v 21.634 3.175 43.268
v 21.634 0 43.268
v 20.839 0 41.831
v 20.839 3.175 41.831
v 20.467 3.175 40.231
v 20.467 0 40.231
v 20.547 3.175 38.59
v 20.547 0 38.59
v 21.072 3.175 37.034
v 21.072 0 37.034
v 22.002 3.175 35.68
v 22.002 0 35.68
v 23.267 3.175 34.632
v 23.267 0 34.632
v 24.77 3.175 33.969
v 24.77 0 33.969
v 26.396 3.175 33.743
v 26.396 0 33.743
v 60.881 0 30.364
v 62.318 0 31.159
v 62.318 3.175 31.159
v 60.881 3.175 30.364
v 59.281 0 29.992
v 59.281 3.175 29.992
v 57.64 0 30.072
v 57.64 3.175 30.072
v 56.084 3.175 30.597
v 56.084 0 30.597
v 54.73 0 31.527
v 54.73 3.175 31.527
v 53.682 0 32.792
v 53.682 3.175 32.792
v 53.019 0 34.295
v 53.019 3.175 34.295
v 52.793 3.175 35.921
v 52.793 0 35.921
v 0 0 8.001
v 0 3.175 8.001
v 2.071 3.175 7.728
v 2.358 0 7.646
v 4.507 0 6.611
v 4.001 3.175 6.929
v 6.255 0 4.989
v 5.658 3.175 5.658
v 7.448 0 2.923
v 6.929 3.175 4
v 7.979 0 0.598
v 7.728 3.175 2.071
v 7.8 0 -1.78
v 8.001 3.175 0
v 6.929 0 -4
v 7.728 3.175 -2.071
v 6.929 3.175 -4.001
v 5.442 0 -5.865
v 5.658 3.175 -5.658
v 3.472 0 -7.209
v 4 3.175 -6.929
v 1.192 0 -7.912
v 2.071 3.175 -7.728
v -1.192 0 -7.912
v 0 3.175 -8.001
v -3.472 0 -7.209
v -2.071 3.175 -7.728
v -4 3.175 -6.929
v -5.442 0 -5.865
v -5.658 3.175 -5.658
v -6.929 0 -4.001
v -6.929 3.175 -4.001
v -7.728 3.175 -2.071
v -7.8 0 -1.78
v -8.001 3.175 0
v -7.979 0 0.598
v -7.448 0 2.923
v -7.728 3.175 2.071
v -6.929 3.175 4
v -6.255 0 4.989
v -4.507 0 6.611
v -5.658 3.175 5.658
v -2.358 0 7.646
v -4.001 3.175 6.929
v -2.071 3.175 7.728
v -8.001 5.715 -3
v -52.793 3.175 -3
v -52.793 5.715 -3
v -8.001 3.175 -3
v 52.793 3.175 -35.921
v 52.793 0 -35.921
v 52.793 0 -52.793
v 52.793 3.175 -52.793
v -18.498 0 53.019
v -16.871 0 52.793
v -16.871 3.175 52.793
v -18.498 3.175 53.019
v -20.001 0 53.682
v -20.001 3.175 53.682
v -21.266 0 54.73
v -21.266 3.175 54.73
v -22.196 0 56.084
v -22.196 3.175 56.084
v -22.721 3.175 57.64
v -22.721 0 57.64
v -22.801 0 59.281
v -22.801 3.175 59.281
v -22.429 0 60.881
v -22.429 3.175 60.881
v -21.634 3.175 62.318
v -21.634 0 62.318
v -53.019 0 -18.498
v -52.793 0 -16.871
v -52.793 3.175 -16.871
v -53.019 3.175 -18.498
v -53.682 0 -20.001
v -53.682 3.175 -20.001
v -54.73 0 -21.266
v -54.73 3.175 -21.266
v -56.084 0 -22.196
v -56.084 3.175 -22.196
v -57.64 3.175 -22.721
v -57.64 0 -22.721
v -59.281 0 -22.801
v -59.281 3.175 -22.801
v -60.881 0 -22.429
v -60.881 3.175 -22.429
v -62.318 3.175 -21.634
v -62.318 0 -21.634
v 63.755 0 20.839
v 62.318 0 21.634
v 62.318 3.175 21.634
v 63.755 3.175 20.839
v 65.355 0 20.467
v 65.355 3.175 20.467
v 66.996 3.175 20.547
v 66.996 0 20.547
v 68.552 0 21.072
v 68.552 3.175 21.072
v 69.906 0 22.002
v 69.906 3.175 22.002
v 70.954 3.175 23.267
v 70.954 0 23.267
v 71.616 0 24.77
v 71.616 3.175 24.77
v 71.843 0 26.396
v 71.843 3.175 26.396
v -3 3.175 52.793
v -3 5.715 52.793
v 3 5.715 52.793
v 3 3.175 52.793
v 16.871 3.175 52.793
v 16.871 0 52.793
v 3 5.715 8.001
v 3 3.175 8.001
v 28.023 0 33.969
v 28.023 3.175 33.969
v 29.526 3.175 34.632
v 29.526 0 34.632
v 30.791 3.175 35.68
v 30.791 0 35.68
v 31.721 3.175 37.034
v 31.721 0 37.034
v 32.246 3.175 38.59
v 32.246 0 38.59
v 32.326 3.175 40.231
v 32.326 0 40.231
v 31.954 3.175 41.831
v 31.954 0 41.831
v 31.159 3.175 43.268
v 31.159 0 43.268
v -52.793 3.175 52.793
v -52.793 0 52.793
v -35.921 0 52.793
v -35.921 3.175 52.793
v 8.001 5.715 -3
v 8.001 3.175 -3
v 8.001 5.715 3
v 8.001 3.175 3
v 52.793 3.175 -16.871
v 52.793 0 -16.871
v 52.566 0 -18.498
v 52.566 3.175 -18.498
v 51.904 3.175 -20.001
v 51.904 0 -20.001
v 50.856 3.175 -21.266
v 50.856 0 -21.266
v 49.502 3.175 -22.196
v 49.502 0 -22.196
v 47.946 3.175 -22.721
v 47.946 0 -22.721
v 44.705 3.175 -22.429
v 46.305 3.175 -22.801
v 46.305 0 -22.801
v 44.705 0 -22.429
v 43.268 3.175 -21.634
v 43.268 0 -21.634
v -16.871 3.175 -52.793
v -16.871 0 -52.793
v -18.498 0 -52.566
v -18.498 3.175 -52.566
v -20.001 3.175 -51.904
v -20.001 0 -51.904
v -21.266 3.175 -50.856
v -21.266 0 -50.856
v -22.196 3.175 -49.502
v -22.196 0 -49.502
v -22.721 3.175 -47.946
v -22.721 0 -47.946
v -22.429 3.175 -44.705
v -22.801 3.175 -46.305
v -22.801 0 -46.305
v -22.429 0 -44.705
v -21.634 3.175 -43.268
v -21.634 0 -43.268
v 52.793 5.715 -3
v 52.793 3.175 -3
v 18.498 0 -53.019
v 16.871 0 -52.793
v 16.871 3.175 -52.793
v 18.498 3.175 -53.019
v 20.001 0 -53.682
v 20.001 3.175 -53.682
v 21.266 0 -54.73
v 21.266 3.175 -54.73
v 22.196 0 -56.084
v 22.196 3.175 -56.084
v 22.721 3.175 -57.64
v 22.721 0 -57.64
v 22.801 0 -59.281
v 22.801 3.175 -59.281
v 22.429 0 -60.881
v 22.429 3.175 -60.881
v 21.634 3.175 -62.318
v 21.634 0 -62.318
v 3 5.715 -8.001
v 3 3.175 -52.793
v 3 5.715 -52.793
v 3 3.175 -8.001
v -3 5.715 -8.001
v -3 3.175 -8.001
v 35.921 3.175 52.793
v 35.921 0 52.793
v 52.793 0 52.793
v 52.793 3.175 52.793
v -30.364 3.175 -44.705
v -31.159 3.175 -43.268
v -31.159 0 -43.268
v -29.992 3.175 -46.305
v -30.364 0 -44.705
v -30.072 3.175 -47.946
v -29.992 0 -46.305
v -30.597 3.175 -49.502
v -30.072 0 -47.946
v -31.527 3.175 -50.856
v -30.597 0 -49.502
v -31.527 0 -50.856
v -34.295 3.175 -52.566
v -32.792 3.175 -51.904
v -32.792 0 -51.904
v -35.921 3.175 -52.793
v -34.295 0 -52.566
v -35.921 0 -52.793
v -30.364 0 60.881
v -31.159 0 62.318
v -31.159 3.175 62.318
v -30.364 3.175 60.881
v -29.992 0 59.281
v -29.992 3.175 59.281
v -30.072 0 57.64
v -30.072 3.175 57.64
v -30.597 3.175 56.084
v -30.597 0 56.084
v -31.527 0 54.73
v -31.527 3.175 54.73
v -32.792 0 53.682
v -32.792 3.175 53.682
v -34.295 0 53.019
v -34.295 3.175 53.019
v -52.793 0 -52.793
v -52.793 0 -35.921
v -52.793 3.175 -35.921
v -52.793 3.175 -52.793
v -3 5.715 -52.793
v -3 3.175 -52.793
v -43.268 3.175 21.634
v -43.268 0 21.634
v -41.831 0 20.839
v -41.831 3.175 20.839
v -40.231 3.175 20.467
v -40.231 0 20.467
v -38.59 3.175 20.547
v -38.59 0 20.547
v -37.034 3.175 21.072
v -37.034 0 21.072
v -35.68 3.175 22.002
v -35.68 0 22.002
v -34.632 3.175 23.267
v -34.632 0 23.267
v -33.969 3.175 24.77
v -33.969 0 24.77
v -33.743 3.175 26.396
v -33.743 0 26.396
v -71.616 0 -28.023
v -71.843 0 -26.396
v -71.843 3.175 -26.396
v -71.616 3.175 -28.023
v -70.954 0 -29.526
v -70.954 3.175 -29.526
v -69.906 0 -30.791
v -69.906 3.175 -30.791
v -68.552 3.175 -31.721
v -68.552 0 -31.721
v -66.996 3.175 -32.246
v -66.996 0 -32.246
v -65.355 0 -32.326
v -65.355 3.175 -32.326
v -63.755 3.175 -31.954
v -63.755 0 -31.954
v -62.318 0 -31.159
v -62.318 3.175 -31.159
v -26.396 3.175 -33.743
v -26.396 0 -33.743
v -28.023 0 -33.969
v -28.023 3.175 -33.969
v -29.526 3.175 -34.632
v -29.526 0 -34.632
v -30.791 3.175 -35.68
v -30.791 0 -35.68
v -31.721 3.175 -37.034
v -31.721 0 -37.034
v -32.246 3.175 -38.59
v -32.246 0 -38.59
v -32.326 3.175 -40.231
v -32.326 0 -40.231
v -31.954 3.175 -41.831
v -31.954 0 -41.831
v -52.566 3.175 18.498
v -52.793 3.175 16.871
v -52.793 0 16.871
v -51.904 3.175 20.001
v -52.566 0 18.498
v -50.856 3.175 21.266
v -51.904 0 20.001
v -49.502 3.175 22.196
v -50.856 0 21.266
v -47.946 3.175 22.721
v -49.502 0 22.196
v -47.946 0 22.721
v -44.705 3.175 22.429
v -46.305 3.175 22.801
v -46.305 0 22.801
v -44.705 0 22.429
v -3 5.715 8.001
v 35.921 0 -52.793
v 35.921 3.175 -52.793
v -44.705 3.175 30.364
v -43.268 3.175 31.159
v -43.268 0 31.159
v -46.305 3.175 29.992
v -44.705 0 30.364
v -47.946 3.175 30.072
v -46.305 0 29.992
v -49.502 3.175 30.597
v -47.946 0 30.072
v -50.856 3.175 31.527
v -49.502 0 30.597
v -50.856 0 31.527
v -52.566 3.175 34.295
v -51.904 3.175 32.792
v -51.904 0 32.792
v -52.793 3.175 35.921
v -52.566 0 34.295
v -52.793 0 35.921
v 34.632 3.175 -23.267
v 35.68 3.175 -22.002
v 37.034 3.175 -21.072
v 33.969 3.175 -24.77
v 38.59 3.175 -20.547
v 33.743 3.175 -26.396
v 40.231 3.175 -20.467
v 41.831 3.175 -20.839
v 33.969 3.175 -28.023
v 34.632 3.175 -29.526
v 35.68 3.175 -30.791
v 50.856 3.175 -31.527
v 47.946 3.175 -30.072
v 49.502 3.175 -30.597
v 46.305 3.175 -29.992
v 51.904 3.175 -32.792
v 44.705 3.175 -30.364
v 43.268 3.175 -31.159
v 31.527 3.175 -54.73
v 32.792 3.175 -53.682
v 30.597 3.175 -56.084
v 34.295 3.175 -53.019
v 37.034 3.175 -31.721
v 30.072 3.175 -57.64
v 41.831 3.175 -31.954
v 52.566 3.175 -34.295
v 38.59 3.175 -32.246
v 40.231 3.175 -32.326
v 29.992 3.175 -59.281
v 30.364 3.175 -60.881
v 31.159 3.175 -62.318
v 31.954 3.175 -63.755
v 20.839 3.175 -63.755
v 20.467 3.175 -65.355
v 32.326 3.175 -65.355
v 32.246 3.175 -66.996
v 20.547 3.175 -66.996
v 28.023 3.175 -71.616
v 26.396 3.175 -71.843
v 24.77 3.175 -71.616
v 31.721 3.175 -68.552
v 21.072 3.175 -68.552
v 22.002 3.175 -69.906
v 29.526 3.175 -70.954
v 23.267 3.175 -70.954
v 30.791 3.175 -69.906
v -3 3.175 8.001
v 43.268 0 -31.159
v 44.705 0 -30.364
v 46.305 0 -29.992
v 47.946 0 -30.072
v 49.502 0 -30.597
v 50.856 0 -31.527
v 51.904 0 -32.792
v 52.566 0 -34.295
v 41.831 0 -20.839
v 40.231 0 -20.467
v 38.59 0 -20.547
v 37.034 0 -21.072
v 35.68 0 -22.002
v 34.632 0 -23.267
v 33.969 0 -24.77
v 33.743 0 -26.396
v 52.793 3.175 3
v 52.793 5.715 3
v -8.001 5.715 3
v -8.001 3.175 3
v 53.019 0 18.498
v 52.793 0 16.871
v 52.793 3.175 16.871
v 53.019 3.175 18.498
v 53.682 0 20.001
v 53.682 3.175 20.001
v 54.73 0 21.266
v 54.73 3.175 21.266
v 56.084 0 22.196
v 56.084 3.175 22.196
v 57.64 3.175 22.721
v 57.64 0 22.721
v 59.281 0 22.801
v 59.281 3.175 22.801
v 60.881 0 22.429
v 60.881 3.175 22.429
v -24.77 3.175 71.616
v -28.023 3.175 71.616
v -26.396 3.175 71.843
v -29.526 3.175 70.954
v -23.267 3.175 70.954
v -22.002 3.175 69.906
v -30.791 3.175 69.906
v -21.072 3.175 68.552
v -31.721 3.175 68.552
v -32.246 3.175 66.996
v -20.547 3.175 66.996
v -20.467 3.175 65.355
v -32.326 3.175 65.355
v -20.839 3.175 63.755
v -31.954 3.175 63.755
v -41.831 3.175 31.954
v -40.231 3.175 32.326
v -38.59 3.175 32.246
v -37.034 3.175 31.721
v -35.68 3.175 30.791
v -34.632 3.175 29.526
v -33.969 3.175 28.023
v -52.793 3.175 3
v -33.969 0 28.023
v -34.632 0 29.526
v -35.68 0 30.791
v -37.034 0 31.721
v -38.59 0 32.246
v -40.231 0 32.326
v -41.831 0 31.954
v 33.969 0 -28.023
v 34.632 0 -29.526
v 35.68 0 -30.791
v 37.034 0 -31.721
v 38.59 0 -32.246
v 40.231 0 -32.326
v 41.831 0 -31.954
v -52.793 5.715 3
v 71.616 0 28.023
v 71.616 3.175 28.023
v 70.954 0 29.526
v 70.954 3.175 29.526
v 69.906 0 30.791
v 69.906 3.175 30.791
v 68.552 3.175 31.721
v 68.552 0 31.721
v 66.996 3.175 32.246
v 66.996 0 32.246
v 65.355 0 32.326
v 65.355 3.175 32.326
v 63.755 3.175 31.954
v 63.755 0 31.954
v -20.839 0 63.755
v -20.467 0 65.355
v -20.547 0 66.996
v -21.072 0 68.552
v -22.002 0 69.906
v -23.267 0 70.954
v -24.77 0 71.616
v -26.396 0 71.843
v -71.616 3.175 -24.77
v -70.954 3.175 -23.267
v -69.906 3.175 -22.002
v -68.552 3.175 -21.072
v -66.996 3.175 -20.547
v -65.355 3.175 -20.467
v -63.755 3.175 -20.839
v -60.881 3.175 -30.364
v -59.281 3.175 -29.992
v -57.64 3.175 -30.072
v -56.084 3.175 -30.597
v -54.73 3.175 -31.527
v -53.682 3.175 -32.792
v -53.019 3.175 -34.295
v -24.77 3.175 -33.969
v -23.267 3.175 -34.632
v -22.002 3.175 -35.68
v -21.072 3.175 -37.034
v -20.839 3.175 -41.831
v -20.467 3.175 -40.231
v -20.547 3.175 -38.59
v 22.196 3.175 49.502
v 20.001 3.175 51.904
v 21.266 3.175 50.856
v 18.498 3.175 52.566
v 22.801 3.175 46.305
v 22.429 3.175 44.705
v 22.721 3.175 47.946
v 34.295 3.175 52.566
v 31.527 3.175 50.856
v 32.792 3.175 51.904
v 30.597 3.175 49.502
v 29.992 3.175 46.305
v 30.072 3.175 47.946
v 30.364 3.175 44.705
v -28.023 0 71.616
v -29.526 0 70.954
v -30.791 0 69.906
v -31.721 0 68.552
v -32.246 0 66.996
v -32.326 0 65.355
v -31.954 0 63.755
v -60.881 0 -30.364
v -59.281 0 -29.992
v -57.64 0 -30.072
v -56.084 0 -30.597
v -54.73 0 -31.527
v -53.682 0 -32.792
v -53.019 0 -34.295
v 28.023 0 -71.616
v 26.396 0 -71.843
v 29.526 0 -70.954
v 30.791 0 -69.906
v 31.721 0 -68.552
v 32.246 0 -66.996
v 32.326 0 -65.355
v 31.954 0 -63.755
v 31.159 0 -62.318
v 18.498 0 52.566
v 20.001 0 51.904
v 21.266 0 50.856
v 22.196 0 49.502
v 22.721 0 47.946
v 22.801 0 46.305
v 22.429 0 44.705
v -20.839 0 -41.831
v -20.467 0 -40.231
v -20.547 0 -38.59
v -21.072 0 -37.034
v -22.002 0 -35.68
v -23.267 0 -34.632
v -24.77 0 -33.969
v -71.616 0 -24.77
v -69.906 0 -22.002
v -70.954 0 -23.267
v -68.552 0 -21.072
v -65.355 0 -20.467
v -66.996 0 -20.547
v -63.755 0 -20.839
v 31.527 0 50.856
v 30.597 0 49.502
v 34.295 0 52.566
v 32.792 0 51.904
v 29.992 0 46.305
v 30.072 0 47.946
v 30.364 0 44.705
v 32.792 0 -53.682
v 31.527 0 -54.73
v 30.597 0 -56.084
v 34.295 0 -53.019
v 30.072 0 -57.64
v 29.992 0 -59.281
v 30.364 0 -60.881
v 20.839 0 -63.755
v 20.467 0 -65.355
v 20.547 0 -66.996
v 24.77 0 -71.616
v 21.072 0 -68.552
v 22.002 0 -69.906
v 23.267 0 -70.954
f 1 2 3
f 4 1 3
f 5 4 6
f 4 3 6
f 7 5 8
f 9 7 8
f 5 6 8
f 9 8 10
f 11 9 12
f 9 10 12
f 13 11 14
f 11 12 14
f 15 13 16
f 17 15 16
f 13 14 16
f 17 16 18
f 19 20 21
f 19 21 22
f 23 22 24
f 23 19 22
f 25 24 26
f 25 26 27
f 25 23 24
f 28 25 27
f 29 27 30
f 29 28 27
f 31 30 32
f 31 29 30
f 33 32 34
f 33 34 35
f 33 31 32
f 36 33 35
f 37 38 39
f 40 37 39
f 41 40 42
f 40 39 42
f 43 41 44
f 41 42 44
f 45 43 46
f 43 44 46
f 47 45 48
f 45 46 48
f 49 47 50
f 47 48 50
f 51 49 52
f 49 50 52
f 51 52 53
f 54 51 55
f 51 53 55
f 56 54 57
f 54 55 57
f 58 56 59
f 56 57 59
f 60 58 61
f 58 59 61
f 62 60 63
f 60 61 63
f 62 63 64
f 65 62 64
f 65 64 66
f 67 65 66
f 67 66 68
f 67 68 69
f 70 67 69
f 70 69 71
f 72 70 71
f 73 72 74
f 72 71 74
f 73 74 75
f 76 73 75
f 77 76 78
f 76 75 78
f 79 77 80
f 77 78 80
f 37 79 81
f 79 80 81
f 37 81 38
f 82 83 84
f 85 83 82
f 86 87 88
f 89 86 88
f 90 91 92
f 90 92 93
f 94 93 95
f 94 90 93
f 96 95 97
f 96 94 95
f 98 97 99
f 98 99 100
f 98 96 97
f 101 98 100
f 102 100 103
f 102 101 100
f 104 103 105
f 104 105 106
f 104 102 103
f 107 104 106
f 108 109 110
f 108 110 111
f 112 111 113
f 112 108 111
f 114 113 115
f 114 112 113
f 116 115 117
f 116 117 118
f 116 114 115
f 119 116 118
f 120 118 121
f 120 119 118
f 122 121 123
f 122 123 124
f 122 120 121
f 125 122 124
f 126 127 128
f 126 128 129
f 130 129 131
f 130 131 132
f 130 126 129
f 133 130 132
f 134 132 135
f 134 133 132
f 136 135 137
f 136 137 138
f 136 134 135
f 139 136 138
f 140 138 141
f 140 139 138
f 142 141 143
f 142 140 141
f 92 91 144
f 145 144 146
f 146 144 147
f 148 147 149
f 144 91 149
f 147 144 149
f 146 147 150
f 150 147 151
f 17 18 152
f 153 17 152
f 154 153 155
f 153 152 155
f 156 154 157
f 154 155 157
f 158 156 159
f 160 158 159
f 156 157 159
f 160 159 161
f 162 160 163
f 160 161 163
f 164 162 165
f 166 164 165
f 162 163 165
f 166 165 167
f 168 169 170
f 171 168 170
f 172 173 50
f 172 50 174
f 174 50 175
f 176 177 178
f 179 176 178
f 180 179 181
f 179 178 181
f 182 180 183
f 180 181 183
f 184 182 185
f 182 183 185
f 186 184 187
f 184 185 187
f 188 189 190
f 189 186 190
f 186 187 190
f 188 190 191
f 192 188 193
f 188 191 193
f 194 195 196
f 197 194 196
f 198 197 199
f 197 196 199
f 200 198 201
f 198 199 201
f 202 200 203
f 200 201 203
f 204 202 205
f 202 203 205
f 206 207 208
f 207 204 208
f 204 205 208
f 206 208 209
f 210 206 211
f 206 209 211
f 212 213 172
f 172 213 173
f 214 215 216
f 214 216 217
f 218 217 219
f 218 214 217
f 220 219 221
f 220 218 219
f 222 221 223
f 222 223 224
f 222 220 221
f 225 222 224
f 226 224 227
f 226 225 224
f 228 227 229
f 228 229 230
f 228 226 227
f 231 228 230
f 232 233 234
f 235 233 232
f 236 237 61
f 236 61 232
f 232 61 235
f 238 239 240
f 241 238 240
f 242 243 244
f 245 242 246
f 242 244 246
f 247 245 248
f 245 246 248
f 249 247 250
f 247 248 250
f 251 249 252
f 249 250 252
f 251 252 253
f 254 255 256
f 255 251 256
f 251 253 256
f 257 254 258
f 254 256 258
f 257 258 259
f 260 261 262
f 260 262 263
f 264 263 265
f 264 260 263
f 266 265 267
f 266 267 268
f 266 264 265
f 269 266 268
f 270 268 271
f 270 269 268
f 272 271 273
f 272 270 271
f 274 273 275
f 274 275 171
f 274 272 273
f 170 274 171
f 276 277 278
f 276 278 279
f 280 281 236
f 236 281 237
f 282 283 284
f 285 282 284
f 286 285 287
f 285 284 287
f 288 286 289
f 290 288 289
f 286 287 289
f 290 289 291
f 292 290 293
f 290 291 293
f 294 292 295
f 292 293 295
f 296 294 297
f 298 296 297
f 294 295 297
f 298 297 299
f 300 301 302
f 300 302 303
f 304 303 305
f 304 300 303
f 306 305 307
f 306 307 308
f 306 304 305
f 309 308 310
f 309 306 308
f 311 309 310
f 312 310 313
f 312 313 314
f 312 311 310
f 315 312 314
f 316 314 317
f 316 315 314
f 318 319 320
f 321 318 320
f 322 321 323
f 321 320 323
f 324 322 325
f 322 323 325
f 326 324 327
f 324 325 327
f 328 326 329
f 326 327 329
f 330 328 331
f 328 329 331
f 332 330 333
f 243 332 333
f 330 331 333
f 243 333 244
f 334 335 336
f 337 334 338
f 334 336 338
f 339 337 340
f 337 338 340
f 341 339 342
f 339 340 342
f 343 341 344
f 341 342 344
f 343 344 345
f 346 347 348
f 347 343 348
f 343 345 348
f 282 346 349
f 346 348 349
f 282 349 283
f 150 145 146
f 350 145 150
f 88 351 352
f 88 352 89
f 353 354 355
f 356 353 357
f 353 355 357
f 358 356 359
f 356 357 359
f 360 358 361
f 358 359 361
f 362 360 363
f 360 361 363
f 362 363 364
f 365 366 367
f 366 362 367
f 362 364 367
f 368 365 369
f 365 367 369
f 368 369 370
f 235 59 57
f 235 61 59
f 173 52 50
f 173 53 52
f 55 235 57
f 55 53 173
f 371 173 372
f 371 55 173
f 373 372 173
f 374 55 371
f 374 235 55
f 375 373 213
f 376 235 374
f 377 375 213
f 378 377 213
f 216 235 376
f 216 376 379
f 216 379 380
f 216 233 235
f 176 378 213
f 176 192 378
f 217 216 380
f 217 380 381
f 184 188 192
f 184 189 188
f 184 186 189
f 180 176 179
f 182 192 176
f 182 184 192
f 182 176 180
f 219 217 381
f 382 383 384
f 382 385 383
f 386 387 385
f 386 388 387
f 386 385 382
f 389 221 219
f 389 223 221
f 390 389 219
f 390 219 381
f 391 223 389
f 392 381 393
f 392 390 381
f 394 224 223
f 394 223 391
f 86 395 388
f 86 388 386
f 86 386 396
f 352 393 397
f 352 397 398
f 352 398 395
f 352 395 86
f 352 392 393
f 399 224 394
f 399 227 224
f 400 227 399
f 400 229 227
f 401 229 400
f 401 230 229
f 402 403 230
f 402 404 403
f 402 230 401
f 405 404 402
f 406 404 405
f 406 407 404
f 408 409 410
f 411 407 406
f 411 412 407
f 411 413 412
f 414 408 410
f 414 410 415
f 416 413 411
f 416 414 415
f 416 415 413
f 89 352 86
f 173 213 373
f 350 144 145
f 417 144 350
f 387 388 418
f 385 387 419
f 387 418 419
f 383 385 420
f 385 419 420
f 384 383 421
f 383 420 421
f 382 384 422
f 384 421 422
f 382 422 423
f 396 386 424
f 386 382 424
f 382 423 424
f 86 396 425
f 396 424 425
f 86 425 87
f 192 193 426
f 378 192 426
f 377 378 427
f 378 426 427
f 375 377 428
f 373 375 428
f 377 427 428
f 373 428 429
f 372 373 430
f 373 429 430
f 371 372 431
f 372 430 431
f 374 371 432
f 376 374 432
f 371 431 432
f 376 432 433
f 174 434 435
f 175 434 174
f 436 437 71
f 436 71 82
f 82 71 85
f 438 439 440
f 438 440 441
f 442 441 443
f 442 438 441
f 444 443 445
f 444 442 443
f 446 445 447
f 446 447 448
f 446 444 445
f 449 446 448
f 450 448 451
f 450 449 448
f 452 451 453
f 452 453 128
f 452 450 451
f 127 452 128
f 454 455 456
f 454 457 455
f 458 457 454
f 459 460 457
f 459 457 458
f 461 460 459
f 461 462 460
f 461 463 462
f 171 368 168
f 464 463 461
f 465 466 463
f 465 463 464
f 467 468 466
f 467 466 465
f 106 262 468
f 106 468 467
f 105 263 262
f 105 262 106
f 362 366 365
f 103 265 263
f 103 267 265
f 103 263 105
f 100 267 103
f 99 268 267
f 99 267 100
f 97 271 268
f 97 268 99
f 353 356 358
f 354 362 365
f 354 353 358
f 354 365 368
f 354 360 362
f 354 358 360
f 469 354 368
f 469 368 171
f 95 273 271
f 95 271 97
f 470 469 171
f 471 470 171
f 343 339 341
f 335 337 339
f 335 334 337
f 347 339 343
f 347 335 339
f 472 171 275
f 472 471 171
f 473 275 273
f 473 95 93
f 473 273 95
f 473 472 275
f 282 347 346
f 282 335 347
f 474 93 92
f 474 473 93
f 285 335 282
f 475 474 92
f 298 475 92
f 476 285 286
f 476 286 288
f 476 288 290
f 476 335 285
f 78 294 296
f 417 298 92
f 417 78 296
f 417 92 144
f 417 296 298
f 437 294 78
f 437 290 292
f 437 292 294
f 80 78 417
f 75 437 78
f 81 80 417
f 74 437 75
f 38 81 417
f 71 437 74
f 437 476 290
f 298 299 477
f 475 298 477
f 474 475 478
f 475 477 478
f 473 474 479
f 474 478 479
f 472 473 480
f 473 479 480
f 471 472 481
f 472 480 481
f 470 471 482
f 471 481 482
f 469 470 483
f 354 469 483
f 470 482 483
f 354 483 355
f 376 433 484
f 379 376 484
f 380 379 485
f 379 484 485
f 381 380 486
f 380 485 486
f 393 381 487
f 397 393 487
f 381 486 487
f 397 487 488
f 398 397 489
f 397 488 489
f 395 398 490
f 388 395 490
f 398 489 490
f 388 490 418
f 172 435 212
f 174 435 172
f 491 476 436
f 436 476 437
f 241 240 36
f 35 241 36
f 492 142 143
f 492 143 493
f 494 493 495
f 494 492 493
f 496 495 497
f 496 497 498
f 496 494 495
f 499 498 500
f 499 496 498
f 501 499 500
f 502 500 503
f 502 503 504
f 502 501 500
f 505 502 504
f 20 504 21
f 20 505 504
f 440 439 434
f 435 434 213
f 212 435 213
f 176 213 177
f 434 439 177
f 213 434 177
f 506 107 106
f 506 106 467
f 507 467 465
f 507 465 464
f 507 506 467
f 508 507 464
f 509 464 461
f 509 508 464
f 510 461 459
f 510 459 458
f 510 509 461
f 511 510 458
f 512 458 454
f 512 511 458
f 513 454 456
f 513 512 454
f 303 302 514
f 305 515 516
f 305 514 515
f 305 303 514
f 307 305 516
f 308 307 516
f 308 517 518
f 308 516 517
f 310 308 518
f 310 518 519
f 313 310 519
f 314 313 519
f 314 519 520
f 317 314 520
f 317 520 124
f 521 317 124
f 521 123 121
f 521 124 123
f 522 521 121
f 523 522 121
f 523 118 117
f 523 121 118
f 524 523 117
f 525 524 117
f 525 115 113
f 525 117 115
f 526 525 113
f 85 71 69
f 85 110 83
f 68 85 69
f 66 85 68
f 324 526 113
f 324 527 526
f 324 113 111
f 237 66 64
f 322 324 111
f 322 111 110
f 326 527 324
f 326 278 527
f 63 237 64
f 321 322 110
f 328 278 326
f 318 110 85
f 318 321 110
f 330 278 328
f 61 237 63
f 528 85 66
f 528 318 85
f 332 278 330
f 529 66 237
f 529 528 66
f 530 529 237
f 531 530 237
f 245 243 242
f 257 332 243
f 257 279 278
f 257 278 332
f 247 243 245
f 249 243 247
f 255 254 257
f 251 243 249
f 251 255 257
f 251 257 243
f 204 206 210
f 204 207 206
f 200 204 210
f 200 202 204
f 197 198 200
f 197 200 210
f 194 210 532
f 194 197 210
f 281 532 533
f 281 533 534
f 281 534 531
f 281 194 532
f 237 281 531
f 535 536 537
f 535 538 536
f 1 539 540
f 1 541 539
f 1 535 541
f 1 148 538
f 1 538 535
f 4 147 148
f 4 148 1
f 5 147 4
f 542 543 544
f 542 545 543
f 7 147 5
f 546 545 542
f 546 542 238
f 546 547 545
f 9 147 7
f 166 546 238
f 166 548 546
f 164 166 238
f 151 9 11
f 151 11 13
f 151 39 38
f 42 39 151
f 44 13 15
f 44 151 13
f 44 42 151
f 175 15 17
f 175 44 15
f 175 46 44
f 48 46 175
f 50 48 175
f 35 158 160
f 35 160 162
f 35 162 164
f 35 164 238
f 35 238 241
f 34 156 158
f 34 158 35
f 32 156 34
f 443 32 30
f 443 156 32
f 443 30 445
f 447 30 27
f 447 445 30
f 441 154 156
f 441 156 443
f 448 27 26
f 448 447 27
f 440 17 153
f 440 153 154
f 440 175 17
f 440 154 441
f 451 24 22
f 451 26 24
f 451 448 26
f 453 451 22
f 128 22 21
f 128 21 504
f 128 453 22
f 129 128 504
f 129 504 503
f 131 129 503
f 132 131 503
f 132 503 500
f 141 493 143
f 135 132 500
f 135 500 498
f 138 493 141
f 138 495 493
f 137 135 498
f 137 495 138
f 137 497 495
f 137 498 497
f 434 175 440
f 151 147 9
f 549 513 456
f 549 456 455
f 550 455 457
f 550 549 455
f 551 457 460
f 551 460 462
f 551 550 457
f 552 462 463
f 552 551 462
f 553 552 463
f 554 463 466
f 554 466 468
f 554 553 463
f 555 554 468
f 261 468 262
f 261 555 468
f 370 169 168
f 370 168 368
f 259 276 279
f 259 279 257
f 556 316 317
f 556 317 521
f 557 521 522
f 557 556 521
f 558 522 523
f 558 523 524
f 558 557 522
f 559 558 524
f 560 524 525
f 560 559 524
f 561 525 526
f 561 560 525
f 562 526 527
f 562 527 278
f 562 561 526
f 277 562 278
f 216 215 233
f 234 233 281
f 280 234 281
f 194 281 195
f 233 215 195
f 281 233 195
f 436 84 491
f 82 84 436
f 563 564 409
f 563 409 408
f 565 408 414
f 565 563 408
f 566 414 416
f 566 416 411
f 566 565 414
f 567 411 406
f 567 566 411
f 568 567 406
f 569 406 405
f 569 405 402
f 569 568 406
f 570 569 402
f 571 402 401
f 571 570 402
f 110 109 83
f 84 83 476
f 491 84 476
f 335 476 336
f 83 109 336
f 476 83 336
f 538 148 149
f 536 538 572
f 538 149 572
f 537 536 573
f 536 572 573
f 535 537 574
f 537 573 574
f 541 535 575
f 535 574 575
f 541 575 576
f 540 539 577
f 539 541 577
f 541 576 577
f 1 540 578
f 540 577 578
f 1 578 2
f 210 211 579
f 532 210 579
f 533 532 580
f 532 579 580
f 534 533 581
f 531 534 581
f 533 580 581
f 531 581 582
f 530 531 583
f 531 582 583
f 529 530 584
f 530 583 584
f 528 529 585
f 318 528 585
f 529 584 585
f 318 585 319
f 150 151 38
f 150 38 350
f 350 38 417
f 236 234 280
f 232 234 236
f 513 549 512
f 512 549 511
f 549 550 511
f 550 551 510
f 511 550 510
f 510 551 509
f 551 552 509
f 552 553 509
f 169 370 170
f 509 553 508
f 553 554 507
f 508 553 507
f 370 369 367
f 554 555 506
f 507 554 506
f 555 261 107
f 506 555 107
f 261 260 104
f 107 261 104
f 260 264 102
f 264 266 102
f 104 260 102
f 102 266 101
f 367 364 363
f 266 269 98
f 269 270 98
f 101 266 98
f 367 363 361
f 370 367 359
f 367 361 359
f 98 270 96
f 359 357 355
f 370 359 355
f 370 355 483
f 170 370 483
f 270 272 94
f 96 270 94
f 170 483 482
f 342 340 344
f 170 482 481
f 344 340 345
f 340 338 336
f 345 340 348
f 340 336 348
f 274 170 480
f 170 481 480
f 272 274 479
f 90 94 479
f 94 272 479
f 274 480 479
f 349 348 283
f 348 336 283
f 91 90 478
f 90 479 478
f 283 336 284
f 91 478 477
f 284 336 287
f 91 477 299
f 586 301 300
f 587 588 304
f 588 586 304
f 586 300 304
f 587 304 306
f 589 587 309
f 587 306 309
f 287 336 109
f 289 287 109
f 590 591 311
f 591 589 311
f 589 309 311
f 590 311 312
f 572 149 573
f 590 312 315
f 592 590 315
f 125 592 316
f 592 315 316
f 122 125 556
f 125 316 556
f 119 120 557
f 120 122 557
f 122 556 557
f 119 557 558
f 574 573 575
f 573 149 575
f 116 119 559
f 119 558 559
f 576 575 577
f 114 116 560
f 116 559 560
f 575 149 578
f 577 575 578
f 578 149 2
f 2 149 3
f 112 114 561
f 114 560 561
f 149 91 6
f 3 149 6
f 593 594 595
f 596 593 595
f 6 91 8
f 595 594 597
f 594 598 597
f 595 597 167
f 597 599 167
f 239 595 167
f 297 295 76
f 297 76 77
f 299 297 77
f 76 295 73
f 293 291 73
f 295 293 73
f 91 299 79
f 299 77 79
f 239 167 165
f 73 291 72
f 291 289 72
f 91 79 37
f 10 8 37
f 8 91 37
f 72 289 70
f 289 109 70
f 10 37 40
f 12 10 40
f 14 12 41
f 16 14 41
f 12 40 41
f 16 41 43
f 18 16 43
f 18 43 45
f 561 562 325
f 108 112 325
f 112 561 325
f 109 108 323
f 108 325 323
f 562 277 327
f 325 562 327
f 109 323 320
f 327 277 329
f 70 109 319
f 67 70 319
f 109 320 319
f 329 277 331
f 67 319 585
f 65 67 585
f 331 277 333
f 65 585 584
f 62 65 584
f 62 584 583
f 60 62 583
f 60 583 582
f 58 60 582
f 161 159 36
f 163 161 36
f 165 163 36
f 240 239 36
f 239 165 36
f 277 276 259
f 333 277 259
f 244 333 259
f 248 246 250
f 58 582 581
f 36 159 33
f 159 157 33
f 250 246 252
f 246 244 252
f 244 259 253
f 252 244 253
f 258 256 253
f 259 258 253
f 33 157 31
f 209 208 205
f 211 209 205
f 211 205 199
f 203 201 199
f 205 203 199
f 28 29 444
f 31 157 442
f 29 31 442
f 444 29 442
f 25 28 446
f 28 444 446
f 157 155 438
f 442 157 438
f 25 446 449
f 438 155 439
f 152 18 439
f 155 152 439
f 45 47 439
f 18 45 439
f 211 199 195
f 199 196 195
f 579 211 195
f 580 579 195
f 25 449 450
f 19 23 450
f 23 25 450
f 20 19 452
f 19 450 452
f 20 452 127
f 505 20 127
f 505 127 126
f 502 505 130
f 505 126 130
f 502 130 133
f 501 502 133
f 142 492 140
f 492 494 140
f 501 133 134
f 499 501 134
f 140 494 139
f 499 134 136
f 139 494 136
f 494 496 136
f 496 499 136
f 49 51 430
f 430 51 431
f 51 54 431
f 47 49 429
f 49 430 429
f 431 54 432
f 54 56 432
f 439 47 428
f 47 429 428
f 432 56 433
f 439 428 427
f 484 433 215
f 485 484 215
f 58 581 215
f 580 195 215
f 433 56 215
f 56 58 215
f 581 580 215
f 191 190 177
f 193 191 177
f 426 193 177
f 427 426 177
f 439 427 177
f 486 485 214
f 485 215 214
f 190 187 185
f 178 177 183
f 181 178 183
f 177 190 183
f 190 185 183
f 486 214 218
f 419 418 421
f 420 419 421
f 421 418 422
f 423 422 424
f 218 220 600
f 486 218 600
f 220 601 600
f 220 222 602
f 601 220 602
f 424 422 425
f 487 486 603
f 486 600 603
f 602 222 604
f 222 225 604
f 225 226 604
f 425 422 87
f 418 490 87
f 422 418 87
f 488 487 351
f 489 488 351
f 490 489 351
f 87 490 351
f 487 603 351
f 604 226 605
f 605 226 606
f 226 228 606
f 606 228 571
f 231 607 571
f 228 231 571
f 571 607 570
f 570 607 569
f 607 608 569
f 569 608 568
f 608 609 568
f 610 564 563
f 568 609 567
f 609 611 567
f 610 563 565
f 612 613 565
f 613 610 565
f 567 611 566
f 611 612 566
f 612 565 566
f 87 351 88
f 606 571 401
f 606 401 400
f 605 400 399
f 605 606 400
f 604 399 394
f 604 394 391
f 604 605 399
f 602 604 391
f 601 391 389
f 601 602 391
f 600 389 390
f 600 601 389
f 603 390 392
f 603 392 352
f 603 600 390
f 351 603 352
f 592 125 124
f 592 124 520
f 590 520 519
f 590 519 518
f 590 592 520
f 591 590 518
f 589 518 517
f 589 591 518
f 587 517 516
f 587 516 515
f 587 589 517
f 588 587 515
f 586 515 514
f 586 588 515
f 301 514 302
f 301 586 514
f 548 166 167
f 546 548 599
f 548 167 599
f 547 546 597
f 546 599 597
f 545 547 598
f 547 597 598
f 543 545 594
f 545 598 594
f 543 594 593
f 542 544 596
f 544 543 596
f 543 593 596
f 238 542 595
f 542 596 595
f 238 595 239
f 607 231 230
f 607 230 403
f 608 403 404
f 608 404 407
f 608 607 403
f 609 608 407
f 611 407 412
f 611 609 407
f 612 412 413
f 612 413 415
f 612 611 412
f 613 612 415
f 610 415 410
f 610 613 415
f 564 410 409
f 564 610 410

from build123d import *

# Parameters (mm, degrees)
SKETCH1_W           = 105.585817276
SKETCH1_H           = 105.585817276
BOSS_EXTRUDE1_DEPTH = 3.175
BOSS_EXTRUDE2_DEPTH = 3.175
CUT_EXTRUDE2_DEPTH  = 90.210847709
CIRPATTERN1_COUNT   = 4
SKETCH4_R           = 8.001
CUT_EXTRUDE3_DEPTH  = 3.175
SKETCH5_W           = 44.791908638
SKETCH5_H           = 3
BOSS_EXTRUDE3_DEPTH = 2.54
CIRPATTERN2_COUNT   = 4


with BuildPart() as part:
    # Sketch1 → Boss-Extrude1 (new body)
    with BuildSketch(Plane(origin=(0, 0, 0), x_dir=(1, 0, 0), z_dir=(0, 1, 0))):
        Rectangle(SKETCH1_W, SKETCH1_H)
    extrude(amount=BOSS_EXTRUDE1_DEPTH)

    # Sketch2 → Boss-Extrude2 (add)
    with BuildSketch(Plane(origin=(0, 0, 0), x_dir=(1, 0, 0), z_dir=(0, 1, 0))):
        with BuildLine():
            Line((-52.792908638, 35.921454319), (-52.792908638, 16.871454319))
            ThreePointArc((-52.792908638, 16.871454319), (-56.083715202, 22.19609119), (-62.317908638, 21.633954319))
            ThreePointArc((-62.317908638, 21.633954319), (-68.552102074, 21.071817448), (-71.842908638, 26.396454319))
            ThreePointArc((-71.842908638, 26.396454319), (-68.552102074, 31.72109119), (-62.317908638, 31.158954319))
            ThreePointArc((-62.317908638, 31.158954319), (-56.083715202, 30.596817448), (-52.792908638, 35.921454319))
        make_face()
    boss_extrude2 = extrude(amount=BOSS_EXTRUDE2_DEPTH)

    # Sketch2<3> → Cut-Extrude2 (cut, through all)
    with BuildSketch(Plane(origin=(0, 0, 0), x_dir=(1, 0, 0), z_dir=(0, 1, 0))):
        with BuildLine():
            Line((-52.792908638, -35.921454319), (-52.792908638, -16.871454319))
            ThreePointArc((-52.792908638, -16.871454319), (-49.502102074, -22.19609119), (-43.267908638, -21.633954319))
            ThreePointArc((-43.267908638, -21.633954319), (-37.033715202, -21.071817448), (-33.742908638, -26.396454319))
            ThreePointArc((-33.742908638, -26.396454319), (-37.033715202, -31.72109119), (-43.267908638, -31.158954319))
            ThreePointArc((-43.267908638, -31.158954319), (-49.502102074, -30.596817448), (-52.792908638, -35.921454319))
        make_face()
    cut_extrude2 = extrude(amount=CUT_EXTRUDE2_DEPTH, mode=Mode.SUBTRACT)

    # CirPattern1: Boss-Extrude2, Cut-Extrude2 ×4 about axis
    cirpattern1_axis = Axis((0, 0, 0), (0, 1, 0))
    add([boss_extrude2.rotate(cirpattern1_axis, i * 360 / CIRPATTERN1_COUNT) for i in range(1, CIRPATTERN1_COUNT)])
    add([cut_extrude2.rotate(cirpattern1_axis, i * 360 / CIRPATTERN1_COUNT) for i in range(1, CIRPATTERN1_COUNT)], mode=Mode.SUBTRACT)

    # Sketch4 → Cut-Extrude3 (cut)
    with BuildSketch(Plane(origin=(0, 3.175, 0), x_dir=(1, 0, 0), z_dir=(0, 1, 0))):
        with Locations(Location((0, 0, 0), (0, 0, 270))):
            Circle(SKETCH4_R)
    extrude(amount=-CUT_EXTRUDE3_DEPTH, mode=Mode.SUBTRACT)

    # Sketch5 → Boss-Extrude3 (add)
    with BuildSketch(Plane(origin=(0, 3.175, 0), x_dir=(1, 0, 0), z_dir=(0, 1, 0))):
        with Locations((-30.396954319, -1.5)):
            Rectangle(SKETCH5_W, SKETCH5_H)
        with Locations((-30.396954319, 1.5)):
            Rectangle(SKETCH5_W, SKETCH5_H)
    boss_extrude3 = extrude(amount=BOSS_EXTRUDE3_DEPTH)

    # CirPattern2: Boss-Extrude3 ×4 about axis
    cirpattern2_axis = Axis((0, 0, 0), (0, 1, 0))
    for i in range(1, CIRPATTERN2_COUNT):
        add(boss_extrude3.rotate(cirpattern2_axis, i * 360 / CIRPATTERN2_COUNT))


solid = part.part
